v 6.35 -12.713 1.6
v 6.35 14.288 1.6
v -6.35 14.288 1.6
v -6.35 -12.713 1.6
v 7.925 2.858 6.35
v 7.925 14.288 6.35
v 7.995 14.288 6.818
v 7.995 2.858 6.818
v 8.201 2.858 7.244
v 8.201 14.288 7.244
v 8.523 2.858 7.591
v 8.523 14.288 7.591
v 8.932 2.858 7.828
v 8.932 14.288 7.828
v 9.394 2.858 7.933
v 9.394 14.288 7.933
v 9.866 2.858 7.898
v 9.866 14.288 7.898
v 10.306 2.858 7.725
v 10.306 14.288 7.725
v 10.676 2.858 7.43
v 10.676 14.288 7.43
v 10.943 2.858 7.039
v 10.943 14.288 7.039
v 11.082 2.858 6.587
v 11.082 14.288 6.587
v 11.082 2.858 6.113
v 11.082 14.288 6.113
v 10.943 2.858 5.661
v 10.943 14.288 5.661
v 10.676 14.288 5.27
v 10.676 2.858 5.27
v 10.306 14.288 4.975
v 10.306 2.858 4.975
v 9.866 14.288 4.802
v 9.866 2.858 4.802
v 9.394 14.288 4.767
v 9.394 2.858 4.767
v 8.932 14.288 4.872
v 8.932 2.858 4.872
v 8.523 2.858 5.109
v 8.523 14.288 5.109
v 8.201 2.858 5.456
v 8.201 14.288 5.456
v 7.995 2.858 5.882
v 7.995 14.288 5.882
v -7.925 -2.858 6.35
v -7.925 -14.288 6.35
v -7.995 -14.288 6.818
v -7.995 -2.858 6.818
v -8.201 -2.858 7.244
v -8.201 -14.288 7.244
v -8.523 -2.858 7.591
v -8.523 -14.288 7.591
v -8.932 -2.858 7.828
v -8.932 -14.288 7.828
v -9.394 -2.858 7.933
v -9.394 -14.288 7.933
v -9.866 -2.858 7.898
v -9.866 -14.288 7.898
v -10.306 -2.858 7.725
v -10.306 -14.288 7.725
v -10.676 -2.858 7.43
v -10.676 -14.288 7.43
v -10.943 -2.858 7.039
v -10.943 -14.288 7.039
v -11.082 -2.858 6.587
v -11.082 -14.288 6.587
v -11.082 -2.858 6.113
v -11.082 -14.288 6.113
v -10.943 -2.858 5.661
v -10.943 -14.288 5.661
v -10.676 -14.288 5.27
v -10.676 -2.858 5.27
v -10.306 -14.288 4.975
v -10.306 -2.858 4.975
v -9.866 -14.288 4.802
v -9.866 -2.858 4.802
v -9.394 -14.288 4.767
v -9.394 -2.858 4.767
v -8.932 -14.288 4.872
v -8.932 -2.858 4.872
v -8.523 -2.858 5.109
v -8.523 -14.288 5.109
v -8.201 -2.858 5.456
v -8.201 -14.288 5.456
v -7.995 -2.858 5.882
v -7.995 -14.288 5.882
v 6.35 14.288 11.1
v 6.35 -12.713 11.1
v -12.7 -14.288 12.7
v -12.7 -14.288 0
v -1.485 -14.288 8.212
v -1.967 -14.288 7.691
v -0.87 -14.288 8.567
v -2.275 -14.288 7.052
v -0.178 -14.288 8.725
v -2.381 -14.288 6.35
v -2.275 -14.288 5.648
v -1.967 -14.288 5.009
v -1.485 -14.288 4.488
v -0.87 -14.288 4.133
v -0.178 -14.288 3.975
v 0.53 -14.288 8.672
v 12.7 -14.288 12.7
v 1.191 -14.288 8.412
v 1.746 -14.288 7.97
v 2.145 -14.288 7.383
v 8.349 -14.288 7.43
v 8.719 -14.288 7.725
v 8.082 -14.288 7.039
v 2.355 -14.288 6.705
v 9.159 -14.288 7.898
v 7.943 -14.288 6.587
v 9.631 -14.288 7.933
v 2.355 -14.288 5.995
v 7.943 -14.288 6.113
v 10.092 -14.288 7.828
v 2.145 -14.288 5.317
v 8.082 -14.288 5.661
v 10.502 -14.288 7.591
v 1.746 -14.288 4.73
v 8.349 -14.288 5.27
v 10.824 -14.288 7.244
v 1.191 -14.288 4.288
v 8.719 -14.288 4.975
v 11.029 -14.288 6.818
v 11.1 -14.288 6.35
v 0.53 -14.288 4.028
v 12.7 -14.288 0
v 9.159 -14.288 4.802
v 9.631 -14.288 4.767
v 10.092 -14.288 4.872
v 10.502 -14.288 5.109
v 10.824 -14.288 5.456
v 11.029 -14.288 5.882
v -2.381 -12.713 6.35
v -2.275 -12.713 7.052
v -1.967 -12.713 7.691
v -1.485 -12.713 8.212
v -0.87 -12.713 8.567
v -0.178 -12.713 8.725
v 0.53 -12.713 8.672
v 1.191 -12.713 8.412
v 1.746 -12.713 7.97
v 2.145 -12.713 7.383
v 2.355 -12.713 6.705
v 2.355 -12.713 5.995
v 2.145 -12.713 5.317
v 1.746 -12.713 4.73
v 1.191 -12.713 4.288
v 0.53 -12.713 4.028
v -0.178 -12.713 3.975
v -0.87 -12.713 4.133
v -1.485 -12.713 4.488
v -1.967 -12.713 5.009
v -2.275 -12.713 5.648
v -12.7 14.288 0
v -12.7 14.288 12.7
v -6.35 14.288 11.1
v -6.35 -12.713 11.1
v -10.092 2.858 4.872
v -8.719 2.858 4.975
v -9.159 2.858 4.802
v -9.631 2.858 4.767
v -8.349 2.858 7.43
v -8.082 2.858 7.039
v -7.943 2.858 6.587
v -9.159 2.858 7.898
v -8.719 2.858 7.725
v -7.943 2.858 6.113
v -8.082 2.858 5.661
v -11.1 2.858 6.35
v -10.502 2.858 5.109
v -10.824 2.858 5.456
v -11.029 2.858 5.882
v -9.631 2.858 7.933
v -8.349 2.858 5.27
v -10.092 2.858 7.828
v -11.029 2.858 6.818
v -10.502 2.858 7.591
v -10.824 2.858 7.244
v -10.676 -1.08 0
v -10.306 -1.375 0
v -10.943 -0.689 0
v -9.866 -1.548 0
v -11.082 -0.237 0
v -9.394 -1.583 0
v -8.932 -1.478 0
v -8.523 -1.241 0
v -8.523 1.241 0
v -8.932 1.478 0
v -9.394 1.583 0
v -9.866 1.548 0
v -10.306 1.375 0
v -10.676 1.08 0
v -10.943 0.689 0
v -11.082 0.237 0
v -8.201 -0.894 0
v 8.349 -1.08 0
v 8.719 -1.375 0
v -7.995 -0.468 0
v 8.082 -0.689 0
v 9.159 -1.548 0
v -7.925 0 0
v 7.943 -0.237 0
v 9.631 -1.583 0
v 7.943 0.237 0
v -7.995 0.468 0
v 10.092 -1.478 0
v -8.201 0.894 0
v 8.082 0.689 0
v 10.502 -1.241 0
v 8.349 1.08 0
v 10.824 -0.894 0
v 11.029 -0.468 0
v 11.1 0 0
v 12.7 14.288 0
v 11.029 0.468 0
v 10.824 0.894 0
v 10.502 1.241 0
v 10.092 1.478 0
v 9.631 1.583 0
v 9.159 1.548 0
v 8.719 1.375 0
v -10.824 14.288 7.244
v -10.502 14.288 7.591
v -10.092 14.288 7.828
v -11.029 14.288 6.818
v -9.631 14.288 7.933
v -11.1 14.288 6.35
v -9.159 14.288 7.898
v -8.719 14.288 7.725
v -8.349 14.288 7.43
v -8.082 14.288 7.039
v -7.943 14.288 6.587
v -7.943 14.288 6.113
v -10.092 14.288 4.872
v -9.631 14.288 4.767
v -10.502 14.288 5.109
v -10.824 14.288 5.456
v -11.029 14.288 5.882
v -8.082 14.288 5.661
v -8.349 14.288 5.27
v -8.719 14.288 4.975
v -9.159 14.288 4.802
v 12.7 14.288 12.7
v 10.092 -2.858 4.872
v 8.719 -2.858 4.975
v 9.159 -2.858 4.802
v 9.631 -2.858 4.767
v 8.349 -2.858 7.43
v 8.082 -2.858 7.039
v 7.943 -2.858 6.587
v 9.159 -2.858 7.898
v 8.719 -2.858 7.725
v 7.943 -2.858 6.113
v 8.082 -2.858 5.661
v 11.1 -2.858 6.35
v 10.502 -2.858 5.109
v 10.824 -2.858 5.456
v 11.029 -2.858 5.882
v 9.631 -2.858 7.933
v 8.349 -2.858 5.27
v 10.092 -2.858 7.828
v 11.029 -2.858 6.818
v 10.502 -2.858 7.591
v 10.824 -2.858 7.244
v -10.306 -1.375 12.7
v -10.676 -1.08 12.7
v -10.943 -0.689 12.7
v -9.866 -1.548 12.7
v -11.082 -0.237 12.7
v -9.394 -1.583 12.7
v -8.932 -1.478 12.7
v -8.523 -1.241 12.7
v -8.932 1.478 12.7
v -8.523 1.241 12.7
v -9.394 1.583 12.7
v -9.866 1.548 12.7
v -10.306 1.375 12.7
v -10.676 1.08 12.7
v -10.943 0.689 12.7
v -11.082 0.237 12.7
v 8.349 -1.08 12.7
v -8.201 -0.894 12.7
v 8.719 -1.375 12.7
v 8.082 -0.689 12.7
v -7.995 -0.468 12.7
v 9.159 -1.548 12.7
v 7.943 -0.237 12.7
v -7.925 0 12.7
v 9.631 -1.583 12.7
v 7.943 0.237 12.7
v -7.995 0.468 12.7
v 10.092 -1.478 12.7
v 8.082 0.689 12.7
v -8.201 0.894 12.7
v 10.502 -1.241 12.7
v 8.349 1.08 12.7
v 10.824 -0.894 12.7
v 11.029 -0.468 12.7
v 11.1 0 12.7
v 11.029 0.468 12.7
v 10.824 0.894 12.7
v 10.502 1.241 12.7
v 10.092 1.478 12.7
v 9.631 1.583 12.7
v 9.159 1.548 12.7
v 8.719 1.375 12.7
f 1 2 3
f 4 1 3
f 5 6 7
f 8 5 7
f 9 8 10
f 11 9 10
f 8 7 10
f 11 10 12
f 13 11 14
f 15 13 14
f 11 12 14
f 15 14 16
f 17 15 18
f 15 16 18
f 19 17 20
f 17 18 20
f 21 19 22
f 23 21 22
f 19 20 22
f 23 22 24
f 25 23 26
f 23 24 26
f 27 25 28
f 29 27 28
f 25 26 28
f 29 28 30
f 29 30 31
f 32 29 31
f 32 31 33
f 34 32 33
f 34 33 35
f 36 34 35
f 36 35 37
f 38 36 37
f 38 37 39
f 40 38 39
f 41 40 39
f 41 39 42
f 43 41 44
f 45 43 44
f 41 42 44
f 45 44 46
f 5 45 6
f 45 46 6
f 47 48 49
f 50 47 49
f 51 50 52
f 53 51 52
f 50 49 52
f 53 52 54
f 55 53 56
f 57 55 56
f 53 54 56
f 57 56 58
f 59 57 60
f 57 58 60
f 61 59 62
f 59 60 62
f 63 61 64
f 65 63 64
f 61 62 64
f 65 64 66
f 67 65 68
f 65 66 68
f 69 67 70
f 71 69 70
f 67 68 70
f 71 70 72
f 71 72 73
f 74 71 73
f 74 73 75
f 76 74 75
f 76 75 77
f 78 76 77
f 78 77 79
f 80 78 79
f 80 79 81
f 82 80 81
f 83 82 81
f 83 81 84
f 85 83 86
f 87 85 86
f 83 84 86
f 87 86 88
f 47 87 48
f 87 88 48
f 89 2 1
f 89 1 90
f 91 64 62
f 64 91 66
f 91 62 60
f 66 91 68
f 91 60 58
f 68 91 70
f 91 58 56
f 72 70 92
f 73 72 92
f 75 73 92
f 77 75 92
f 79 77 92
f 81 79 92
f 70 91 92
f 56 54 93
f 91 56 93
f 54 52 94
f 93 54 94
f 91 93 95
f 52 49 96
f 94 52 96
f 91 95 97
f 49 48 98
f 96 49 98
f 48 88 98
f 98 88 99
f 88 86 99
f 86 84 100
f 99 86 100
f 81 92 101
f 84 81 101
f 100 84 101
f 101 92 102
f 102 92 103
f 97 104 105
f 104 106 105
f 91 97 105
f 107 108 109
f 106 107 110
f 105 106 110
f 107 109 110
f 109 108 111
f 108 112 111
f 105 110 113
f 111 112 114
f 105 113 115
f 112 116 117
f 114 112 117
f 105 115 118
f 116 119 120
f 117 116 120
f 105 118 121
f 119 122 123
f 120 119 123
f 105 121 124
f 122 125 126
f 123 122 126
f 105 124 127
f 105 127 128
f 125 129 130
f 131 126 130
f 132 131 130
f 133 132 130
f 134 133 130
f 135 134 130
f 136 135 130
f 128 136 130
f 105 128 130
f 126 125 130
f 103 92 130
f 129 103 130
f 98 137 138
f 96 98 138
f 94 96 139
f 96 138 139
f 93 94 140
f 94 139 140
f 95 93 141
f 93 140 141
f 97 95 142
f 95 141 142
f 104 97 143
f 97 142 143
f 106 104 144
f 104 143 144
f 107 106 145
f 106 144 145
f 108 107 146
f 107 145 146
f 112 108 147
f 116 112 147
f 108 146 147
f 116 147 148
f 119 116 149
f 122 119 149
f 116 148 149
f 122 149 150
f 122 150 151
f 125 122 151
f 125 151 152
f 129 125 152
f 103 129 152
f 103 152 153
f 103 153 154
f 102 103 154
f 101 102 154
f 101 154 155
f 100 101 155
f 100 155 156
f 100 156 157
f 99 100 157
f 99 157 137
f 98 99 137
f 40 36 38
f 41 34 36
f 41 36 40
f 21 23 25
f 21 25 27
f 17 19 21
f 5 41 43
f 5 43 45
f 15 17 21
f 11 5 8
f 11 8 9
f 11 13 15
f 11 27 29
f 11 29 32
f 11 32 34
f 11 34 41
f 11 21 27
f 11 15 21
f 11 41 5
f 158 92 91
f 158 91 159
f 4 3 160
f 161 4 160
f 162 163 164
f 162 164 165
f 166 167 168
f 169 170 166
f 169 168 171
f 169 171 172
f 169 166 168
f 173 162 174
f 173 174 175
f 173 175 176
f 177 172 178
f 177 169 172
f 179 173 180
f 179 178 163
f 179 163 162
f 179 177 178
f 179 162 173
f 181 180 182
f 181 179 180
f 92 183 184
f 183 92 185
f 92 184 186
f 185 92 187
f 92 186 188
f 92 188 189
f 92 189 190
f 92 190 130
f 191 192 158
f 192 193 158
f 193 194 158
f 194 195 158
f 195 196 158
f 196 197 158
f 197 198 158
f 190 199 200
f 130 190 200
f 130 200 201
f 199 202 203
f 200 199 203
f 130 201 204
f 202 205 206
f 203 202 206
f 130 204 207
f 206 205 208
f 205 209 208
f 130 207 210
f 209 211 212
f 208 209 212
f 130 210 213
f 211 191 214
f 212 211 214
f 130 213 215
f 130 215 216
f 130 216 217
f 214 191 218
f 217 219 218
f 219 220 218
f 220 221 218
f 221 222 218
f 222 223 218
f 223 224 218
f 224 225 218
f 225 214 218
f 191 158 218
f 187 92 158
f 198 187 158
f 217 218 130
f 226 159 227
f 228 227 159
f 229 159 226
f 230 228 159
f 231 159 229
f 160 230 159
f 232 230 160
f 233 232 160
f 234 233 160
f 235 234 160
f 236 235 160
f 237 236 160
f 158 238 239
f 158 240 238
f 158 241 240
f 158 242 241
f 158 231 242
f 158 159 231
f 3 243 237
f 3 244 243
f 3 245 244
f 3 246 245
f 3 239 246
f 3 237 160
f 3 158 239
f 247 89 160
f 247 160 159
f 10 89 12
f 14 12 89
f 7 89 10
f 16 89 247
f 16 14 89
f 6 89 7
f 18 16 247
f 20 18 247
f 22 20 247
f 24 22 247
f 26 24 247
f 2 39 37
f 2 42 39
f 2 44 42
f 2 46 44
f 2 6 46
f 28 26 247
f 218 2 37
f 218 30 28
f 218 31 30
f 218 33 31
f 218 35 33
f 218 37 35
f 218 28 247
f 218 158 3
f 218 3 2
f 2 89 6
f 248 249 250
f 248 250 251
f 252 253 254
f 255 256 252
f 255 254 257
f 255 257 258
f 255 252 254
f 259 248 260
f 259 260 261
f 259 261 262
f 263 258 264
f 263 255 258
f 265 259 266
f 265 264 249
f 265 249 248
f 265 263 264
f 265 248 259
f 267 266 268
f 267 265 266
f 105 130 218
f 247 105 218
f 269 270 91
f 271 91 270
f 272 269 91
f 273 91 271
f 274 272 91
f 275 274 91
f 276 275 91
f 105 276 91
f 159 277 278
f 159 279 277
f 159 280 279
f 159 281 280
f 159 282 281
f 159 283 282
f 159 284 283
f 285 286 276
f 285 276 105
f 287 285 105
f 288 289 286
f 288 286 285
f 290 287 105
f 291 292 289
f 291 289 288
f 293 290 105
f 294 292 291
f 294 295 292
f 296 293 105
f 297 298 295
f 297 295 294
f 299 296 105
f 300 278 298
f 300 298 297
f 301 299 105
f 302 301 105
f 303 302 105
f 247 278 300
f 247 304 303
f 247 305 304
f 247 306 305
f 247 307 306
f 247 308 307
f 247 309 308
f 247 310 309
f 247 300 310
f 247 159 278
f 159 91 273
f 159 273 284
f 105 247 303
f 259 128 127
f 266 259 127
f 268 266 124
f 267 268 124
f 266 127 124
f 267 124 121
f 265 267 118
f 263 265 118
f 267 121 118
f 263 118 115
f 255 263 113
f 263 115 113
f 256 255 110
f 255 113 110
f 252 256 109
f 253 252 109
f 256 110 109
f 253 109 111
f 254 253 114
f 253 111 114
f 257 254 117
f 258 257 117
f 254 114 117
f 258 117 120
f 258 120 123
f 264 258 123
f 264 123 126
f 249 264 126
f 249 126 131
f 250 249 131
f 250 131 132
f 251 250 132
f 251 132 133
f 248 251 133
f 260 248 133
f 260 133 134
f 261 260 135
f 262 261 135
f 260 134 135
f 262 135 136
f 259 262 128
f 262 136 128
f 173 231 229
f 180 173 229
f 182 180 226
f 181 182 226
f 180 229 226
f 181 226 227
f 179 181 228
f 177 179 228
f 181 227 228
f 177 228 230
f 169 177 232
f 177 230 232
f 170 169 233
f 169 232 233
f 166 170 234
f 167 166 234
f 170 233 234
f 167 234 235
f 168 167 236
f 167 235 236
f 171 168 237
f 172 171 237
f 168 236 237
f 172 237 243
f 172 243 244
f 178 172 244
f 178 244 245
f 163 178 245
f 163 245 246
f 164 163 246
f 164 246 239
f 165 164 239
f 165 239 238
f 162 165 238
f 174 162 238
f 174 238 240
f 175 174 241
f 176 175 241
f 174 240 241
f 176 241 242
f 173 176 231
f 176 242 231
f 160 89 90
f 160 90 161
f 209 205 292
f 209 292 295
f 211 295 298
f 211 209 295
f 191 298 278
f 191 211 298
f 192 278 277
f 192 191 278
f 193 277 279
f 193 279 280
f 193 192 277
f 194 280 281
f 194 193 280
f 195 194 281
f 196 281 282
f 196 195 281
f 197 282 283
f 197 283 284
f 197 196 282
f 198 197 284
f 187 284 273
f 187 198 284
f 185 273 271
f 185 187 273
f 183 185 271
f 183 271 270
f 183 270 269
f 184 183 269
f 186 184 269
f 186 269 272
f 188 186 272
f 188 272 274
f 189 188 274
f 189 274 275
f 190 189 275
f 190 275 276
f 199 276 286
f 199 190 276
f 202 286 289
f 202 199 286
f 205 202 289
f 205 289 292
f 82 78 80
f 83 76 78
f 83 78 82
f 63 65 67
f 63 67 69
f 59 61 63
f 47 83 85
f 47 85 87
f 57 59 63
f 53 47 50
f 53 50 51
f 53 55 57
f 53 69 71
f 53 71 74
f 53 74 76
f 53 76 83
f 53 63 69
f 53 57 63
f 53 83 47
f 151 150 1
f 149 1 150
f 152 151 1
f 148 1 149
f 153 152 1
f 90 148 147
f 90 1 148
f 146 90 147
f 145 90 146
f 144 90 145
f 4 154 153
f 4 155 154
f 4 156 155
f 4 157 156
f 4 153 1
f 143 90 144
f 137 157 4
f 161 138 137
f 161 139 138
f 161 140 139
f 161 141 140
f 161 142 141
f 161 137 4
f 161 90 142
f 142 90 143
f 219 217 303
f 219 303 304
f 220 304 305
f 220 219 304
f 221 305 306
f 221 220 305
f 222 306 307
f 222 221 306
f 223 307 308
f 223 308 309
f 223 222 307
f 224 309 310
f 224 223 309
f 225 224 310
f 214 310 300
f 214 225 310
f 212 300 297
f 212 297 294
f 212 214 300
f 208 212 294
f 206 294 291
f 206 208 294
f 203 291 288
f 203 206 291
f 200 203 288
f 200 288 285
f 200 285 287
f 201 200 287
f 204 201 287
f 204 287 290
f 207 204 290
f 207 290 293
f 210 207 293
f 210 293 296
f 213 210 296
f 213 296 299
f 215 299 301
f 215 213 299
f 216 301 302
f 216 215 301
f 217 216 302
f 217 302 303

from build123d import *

# Parameters (mm, degrees)
F0_W     = 25.4
F0_H     = 28.575
F0_R     = 1.5875
F1_DEPTH = 12.7
F2_W     = 12.7
F2_H     = 9.4996
F3_DEPTH = 27.0002
F4_R     = 2.38125
F5_DEPTH = 1.5758
F6_R     = 1.5875
F7_DEPTH = 11.43
F8_R     = 1.5875
F9_DEPTH = 11.43


with BuildPart() as f1:
    # F0 (on Top) → F1 (new body)
    with BuildSketch(Plane.XY):
        Rectangle(F0_W, F0_H)
        with Locations((-9.5123, 0)):
            Circle(F0_R, mode=Mode.SUBTRACT)
        with Locations((9.5123, 0)):
            Circle(F0_R, mode=Mode.SUBTRACT)
    extrude(amount=F1_DEPTH)

    # F2 (on face) → F3 (cut)
    with BuildSketch(Plane(origin=(0, 14.2875, 0), x_dir=(-1, 0, 0), z_dir=(0, 1, 0))):
        with Locations((0, 6.35)):
            Rectangle(F2_W, F2_H)
    extrude(amount=-F3_DEPTH, mode=Mode.SUBTRACT)

    # F4 (on face) → F5 (cut, through all)
    with BuildSketch(Plane(origin=(0, -12.7127, 0), x_dir=(-1, 0, 0), z_dir=(0, 1, 0))):
        with Locations((0, 6.35)):
            Circle(F4_R)
    extrude(amount=-F5_DEPTH, mode=Mode.SUBTRACT)

    # F6 (on face) → F7 (cut)
    with BuildSketch(Plane.XZ.offset(14.2875)):
        with Locations((-9.5123, 6.35)):
            Circle(F6_R)
        with Locations((9.5123, 6.35)):
            Circle(F6_R)
    extrude(amount=-F7_DEPTH, mode=Mode.SUBTRACT)

    # F8 (on face) → F9 (cut)
    with BuildSketch(Plane(origin=(0, 14.2875, 0), x_dir=(-1, 0, 0), z_dir=(0, 1, 0))):
        with Locations((-9.5123, 6.35)):
            Circle(F8_R)
        with Locations((9.5123, 6.35)):
            Circle(F8_R)
    extrude(amount=-F9_DEPTH, mode=Mode.SUBTRACT)


solid = f1.part
